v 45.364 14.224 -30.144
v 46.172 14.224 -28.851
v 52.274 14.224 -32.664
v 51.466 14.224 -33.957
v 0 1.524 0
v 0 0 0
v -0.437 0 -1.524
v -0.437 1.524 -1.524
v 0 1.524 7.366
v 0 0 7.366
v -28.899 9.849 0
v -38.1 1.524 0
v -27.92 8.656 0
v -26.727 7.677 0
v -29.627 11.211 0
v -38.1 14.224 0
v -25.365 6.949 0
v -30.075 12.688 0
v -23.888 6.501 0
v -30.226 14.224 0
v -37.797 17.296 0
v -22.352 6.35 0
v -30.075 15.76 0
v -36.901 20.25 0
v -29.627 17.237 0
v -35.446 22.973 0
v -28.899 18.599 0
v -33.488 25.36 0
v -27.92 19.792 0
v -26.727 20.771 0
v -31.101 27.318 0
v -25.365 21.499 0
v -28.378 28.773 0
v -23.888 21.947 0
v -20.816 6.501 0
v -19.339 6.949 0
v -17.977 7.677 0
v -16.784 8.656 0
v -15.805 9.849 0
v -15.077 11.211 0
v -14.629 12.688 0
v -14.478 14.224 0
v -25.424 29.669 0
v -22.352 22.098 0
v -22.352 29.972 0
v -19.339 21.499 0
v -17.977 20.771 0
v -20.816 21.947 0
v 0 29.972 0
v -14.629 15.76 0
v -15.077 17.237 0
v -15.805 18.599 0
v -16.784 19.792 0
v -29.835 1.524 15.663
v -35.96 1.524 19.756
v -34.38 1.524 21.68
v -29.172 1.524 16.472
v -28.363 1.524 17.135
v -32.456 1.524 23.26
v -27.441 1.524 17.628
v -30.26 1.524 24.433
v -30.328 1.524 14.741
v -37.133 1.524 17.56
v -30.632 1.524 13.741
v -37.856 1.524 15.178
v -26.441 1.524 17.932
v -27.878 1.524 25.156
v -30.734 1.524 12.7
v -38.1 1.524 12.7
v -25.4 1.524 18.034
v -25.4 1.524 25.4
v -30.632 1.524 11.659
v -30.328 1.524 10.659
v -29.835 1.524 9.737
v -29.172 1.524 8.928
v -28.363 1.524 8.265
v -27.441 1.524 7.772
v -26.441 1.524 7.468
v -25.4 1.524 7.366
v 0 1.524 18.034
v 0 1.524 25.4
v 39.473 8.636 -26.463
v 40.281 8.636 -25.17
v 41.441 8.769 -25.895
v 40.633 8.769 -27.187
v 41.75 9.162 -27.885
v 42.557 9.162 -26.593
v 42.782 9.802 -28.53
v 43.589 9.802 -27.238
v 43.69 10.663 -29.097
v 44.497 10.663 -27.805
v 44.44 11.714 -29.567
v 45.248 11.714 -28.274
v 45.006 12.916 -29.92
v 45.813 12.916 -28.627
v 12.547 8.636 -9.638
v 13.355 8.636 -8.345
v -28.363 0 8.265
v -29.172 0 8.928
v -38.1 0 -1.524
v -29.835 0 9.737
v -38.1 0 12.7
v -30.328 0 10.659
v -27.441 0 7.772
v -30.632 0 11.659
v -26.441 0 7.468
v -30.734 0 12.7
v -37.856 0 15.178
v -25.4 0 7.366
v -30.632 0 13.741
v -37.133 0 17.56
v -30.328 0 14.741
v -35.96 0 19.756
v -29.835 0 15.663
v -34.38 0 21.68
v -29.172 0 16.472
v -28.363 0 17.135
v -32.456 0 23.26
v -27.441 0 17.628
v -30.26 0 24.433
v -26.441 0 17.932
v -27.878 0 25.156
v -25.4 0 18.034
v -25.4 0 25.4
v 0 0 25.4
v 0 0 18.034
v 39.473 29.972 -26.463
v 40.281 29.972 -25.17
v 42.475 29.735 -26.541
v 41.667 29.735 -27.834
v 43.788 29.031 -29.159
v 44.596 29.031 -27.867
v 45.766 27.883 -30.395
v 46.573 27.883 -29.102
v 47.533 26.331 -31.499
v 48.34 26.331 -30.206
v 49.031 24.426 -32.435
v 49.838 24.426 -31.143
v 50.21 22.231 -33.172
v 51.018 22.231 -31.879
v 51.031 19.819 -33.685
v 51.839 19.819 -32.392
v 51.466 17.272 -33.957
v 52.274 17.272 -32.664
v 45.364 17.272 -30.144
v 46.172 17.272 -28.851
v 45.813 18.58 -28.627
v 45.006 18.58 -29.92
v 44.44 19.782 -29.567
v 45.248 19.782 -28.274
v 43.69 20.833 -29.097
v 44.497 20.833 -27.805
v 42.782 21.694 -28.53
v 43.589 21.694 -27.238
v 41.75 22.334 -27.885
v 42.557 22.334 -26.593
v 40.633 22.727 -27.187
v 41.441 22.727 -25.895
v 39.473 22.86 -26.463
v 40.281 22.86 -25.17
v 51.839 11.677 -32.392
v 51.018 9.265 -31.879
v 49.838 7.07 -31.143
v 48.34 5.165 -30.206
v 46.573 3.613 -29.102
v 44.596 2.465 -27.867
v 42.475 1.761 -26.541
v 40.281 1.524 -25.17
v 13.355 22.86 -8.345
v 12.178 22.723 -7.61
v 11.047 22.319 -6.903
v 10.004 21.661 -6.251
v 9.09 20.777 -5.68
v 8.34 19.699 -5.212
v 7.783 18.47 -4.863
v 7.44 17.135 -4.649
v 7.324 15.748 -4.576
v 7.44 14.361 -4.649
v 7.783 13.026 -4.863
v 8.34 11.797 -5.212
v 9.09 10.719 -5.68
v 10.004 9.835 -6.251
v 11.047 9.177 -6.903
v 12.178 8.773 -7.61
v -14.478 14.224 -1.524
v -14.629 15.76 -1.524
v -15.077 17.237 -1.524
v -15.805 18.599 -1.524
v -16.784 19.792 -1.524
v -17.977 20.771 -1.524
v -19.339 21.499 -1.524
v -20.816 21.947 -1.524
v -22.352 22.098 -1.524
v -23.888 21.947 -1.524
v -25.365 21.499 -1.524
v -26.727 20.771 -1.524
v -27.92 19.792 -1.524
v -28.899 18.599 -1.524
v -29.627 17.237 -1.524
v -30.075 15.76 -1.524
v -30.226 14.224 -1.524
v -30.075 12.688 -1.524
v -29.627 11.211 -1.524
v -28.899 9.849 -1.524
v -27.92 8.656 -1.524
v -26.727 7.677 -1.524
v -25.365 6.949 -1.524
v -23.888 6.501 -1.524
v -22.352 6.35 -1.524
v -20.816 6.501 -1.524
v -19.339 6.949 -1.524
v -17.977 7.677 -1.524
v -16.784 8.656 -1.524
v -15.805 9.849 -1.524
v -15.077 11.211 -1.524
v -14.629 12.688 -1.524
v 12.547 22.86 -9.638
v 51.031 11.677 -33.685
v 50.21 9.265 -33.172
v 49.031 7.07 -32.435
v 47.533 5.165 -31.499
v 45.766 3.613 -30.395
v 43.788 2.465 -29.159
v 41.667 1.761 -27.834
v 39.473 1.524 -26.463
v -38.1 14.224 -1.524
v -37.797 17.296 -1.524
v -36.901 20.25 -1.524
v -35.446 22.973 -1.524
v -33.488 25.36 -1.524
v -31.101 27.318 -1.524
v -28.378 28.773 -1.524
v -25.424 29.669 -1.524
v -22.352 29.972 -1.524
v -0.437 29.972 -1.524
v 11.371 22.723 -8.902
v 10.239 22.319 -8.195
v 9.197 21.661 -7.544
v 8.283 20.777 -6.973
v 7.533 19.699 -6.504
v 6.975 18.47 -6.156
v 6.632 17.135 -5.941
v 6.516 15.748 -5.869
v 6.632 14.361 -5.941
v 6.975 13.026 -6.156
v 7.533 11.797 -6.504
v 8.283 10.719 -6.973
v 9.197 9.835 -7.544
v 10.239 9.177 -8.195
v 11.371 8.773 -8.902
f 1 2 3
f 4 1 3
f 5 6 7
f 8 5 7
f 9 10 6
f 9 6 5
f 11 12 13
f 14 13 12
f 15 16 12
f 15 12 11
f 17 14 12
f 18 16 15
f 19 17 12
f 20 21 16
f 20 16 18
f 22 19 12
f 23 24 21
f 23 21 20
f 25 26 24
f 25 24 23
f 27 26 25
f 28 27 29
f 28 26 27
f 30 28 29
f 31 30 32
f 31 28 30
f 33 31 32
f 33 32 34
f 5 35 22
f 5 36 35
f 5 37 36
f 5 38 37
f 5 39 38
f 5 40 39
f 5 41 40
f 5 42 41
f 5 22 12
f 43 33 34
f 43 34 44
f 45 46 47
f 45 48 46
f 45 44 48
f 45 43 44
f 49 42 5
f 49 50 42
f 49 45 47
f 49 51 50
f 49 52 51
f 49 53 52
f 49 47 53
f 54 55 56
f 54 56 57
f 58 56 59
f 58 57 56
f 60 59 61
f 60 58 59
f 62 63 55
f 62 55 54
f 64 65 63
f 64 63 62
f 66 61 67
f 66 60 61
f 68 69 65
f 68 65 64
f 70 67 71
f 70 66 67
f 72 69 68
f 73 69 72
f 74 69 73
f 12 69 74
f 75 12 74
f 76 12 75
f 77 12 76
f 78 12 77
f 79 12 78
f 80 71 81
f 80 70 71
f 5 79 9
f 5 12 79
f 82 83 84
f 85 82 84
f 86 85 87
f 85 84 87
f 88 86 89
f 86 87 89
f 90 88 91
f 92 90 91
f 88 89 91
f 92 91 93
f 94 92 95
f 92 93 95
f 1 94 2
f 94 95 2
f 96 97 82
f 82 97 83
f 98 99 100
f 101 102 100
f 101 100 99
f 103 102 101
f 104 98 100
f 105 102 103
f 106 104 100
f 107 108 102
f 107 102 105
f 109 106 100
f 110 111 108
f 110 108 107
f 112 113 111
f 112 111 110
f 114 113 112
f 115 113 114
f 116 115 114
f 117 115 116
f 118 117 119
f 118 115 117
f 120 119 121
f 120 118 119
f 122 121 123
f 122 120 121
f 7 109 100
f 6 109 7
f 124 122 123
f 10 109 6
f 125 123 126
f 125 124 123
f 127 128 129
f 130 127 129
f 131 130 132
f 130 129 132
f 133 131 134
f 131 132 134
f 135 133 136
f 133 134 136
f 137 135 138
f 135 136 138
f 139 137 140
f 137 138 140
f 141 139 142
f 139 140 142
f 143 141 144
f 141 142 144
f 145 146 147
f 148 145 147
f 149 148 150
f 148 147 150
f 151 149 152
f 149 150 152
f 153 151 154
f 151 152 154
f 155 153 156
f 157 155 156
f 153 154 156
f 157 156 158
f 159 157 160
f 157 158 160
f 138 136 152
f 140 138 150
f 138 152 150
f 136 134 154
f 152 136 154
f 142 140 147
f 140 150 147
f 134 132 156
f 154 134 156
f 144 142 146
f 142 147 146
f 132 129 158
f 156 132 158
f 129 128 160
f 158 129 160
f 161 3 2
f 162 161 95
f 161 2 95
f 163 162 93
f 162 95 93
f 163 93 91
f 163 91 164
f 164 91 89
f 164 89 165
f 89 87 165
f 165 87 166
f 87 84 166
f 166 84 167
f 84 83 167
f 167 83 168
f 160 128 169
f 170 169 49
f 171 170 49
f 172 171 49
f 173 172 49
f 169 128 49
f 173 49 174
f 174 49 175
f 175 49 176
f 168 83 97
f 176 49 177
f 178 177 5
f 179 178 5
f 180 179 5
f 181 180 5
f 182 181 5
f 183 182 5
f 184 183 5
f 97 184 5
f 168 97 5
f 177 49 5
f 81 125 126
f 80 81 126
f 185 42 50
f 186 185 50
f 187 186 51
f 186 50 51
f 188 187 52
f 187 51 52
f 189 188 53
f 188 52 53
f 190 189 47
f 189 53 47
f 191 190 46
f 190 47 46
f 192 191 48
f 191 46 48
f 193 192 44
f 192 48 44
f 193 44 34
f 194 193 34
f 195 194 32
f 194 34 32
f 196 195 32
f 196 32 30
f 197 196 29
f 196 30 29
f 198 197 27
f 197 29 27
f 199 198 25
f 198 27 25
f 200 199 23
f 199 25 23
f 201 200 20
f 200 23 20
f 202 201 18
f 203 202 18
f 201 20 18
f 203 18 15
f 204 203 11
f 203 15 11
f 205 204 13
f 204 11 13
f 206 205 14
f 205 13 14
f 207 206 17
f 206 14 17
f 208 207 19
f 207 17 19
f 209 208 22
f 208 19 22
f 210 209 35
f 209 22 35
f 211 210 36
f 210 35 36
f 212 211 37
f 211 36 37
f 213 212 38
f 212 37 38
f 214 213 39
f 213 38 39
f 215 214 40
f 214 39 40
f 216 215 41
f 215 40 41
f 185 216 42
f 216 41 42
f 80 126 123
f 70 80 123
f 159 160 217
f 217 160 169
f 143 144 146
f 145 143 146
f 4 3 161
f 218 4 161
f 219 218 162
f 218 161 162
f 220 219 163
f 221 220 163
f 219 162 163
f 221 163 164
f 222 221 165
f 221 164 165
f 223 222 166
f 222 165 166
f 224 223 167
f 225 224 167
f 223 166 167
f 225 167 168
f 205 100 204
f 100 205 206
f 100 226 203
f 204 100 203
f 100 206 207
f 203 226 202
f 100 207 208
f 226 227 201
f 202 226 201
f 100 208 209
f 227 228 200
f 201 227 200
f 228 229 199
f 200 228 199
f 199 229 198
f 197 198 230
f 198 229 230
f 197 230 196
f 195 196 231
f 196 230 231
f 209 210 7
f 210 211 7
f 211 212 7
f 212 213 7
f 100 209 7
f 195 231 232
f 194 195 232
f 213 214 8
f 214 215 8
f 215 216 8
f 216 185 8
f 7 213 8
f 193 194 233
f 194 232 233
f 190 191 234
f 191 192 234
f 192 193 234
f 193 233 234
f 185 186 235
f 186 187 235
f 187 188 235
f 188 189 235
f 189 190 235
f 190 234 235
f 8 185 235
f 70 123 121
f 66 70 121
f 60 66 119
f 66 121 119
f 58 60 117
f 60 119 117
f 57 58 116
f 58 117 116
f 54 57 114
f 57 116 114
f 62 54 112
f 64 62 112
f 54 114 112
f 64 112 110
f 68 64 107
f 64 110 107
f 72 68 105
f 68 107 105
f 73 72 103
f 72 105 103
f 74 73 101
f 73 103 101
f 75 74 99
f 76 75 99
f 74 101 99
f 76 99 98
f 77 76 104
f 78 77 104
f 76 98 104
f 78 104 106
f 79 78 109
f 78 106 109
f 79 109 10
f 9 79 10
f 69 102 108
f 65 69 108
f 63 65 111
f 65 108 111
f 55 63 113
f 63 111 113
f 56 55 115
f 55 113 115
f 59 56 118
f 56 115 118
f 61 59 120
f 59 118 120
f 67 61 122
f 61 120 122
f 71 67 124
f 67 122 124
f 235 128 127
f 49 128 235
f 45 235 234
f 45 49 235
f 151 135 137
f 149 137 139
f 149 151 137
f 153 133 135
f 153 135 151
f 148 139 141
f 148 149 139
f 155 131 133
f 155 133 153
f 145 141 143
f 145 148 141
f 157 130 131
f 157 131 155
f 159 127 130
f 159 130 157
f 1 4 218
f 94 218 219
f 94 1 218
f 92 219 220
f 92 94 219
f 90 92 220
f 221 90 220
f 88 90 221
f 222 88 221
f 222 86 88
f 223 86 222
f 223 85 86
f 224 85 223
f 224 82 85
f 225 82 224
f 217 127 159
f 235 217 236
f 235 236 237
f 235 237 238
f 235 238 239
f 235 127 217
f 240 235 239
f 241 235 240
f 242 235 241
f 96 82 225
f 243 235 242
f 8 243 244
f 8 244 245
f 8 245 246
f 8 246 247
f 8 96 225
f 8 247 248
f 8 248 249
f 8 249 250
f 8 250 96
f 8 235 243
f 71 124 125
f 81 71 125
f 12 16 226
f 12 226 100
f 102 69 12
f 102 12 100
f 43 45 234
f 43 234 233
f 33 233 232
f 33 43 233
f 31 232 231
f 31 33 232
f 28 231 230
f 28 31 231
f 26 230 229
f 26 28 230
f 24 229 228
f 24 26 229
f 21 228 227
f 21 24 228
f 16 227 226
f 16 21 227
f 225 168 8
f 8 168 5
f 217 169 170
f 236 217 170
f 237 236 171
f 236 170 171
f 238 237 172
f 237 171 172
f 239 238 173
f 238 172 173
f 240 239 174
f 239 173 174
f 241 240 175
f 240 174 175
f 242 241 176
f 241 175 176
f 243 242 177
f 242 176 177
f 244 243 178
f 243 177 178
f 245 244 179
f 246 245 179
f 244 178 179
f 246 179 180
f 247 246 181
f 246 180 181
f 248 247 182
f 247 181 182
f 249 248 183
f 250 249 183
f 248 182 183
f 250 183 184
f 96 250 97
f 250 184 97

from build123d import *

# Parameters (mm, degrees)
BOSS_EXTRUDE1_DEPTH = 1.524
SKETCH2_R           = 7.874
BOSS_EXTRUDE2_DEPTH = 1.524
BOSS_EXTRUDE3_DEPTH = 1.524
CUT_EXTRUDE1_DEPTH  = 1.524


with BuildPart() as part:
    # Sketch1 → Boss-Extrude1 (new body)
    with BuildSketch(Plane(origin=(0, 0, 0), x_dir=(1, 0, 0), z_dir=(0, 1, 0))):
        with BuildLine():
            Line((0, 0), (-38.1, 0))
            Line((-38.1, 0), (-38.1, -12.7))
            ThreePointArc((-38.1, -12.7), (-34.380256121, -21.680256121), (-25.4, -25.4))
            Line((-25.4, -25.4), (0, -25.4))
            Line((0, -25.4), (0, -18.034))
            Line((0, -18.034), (-25.4, -18.034))
            ThreePointArc((-25.4, -18.034), (-30.734, -12.7), (-25.4, -7.366))
            Line((-25.4, -7.366), (0, -7.366))
            Line((0, -7.366), (0, 0))
        make_face()
    extrude(amount=BOSS_EXTRUDE1_DEPTH)

    # Sketch2 → Boss-Extrude2 (add)
    with BuildSketch(Plane.XY):
        with BuildLine():
            Line((0, 0), (0, 29.972))
            Line((0, 29.972), (-22.352, 29.972))
            ThreePointArc((-22.352, 29.972), (-33.48751759, 25.35951759), (-38.1, 14.224))
            Line((-38.1, 14.224), (-38.1, 0))
            Line((-38.1, 0), (0, 0))
        make_face()
        with Locations((-22.352, 14.224)):
            Circle(SKETCH2_R, mode=Mode.SUBTRACT)
    extrude(amount=-BOSS_EXTRUDE2_DEPTH)

    # Sketch3 → Boss-Extrude3 (add)
    with BuildSketch(Plane(origin=(0, 0, 0), x_dir=(0, 1, 0), z_dir=(0.529919264233206, 0, 0.8480480961564253))):
        with BuildLine():
            Line((29.972, 0), (29.972, -47.498))
            ThreePointArc((29.972, -47.498), (26.330994661, -57.001809762), (17.272, -61.640121482))
            Line((17.272, -61.640121482), (17.272, -54.44479552))
            ThreePointArc((17.272, -54.44479552), (21.289625754, -51.955681909), (22.86, -47.498))
            Line((22.86, -47.498), (22.86, -15.748))
            ThreePointArc((22.86, -15.748), (15.748, -8.636), (8.636, -15.748))
            Line((8.636, -15.748), (8.636, -47.498))
            ThreePointArc((8.636, -47.498), (10.206374246, -51.955681909), (14.224, -54.44479552))
            Line((14.224, -54.44479552), (14.224, -61.640121482))
            ThreePointArc((14.224, -61.640121482), (5.165005339, -57.001809762), (1.524, -47.498))
            Line((1.524, -47.498), (1.524, 0))
            Line((1.524, 0), (29.972, 0))
        make_face()
    extrude(amount=-BOSS_EXTRUDE3_DEPTH)

    # Sketch4 → Cut-Extrude1 (cut)
    with BuildSketch(Plane.XZ):
        Polygon((0, 0), (-0.436999968, -1.524), (0, -1.524), align=None)
    extrude(amount=-CUT_EXTRUDE1_DEPTH, mode=Mode.SUBTRACT)


solid = part.part
